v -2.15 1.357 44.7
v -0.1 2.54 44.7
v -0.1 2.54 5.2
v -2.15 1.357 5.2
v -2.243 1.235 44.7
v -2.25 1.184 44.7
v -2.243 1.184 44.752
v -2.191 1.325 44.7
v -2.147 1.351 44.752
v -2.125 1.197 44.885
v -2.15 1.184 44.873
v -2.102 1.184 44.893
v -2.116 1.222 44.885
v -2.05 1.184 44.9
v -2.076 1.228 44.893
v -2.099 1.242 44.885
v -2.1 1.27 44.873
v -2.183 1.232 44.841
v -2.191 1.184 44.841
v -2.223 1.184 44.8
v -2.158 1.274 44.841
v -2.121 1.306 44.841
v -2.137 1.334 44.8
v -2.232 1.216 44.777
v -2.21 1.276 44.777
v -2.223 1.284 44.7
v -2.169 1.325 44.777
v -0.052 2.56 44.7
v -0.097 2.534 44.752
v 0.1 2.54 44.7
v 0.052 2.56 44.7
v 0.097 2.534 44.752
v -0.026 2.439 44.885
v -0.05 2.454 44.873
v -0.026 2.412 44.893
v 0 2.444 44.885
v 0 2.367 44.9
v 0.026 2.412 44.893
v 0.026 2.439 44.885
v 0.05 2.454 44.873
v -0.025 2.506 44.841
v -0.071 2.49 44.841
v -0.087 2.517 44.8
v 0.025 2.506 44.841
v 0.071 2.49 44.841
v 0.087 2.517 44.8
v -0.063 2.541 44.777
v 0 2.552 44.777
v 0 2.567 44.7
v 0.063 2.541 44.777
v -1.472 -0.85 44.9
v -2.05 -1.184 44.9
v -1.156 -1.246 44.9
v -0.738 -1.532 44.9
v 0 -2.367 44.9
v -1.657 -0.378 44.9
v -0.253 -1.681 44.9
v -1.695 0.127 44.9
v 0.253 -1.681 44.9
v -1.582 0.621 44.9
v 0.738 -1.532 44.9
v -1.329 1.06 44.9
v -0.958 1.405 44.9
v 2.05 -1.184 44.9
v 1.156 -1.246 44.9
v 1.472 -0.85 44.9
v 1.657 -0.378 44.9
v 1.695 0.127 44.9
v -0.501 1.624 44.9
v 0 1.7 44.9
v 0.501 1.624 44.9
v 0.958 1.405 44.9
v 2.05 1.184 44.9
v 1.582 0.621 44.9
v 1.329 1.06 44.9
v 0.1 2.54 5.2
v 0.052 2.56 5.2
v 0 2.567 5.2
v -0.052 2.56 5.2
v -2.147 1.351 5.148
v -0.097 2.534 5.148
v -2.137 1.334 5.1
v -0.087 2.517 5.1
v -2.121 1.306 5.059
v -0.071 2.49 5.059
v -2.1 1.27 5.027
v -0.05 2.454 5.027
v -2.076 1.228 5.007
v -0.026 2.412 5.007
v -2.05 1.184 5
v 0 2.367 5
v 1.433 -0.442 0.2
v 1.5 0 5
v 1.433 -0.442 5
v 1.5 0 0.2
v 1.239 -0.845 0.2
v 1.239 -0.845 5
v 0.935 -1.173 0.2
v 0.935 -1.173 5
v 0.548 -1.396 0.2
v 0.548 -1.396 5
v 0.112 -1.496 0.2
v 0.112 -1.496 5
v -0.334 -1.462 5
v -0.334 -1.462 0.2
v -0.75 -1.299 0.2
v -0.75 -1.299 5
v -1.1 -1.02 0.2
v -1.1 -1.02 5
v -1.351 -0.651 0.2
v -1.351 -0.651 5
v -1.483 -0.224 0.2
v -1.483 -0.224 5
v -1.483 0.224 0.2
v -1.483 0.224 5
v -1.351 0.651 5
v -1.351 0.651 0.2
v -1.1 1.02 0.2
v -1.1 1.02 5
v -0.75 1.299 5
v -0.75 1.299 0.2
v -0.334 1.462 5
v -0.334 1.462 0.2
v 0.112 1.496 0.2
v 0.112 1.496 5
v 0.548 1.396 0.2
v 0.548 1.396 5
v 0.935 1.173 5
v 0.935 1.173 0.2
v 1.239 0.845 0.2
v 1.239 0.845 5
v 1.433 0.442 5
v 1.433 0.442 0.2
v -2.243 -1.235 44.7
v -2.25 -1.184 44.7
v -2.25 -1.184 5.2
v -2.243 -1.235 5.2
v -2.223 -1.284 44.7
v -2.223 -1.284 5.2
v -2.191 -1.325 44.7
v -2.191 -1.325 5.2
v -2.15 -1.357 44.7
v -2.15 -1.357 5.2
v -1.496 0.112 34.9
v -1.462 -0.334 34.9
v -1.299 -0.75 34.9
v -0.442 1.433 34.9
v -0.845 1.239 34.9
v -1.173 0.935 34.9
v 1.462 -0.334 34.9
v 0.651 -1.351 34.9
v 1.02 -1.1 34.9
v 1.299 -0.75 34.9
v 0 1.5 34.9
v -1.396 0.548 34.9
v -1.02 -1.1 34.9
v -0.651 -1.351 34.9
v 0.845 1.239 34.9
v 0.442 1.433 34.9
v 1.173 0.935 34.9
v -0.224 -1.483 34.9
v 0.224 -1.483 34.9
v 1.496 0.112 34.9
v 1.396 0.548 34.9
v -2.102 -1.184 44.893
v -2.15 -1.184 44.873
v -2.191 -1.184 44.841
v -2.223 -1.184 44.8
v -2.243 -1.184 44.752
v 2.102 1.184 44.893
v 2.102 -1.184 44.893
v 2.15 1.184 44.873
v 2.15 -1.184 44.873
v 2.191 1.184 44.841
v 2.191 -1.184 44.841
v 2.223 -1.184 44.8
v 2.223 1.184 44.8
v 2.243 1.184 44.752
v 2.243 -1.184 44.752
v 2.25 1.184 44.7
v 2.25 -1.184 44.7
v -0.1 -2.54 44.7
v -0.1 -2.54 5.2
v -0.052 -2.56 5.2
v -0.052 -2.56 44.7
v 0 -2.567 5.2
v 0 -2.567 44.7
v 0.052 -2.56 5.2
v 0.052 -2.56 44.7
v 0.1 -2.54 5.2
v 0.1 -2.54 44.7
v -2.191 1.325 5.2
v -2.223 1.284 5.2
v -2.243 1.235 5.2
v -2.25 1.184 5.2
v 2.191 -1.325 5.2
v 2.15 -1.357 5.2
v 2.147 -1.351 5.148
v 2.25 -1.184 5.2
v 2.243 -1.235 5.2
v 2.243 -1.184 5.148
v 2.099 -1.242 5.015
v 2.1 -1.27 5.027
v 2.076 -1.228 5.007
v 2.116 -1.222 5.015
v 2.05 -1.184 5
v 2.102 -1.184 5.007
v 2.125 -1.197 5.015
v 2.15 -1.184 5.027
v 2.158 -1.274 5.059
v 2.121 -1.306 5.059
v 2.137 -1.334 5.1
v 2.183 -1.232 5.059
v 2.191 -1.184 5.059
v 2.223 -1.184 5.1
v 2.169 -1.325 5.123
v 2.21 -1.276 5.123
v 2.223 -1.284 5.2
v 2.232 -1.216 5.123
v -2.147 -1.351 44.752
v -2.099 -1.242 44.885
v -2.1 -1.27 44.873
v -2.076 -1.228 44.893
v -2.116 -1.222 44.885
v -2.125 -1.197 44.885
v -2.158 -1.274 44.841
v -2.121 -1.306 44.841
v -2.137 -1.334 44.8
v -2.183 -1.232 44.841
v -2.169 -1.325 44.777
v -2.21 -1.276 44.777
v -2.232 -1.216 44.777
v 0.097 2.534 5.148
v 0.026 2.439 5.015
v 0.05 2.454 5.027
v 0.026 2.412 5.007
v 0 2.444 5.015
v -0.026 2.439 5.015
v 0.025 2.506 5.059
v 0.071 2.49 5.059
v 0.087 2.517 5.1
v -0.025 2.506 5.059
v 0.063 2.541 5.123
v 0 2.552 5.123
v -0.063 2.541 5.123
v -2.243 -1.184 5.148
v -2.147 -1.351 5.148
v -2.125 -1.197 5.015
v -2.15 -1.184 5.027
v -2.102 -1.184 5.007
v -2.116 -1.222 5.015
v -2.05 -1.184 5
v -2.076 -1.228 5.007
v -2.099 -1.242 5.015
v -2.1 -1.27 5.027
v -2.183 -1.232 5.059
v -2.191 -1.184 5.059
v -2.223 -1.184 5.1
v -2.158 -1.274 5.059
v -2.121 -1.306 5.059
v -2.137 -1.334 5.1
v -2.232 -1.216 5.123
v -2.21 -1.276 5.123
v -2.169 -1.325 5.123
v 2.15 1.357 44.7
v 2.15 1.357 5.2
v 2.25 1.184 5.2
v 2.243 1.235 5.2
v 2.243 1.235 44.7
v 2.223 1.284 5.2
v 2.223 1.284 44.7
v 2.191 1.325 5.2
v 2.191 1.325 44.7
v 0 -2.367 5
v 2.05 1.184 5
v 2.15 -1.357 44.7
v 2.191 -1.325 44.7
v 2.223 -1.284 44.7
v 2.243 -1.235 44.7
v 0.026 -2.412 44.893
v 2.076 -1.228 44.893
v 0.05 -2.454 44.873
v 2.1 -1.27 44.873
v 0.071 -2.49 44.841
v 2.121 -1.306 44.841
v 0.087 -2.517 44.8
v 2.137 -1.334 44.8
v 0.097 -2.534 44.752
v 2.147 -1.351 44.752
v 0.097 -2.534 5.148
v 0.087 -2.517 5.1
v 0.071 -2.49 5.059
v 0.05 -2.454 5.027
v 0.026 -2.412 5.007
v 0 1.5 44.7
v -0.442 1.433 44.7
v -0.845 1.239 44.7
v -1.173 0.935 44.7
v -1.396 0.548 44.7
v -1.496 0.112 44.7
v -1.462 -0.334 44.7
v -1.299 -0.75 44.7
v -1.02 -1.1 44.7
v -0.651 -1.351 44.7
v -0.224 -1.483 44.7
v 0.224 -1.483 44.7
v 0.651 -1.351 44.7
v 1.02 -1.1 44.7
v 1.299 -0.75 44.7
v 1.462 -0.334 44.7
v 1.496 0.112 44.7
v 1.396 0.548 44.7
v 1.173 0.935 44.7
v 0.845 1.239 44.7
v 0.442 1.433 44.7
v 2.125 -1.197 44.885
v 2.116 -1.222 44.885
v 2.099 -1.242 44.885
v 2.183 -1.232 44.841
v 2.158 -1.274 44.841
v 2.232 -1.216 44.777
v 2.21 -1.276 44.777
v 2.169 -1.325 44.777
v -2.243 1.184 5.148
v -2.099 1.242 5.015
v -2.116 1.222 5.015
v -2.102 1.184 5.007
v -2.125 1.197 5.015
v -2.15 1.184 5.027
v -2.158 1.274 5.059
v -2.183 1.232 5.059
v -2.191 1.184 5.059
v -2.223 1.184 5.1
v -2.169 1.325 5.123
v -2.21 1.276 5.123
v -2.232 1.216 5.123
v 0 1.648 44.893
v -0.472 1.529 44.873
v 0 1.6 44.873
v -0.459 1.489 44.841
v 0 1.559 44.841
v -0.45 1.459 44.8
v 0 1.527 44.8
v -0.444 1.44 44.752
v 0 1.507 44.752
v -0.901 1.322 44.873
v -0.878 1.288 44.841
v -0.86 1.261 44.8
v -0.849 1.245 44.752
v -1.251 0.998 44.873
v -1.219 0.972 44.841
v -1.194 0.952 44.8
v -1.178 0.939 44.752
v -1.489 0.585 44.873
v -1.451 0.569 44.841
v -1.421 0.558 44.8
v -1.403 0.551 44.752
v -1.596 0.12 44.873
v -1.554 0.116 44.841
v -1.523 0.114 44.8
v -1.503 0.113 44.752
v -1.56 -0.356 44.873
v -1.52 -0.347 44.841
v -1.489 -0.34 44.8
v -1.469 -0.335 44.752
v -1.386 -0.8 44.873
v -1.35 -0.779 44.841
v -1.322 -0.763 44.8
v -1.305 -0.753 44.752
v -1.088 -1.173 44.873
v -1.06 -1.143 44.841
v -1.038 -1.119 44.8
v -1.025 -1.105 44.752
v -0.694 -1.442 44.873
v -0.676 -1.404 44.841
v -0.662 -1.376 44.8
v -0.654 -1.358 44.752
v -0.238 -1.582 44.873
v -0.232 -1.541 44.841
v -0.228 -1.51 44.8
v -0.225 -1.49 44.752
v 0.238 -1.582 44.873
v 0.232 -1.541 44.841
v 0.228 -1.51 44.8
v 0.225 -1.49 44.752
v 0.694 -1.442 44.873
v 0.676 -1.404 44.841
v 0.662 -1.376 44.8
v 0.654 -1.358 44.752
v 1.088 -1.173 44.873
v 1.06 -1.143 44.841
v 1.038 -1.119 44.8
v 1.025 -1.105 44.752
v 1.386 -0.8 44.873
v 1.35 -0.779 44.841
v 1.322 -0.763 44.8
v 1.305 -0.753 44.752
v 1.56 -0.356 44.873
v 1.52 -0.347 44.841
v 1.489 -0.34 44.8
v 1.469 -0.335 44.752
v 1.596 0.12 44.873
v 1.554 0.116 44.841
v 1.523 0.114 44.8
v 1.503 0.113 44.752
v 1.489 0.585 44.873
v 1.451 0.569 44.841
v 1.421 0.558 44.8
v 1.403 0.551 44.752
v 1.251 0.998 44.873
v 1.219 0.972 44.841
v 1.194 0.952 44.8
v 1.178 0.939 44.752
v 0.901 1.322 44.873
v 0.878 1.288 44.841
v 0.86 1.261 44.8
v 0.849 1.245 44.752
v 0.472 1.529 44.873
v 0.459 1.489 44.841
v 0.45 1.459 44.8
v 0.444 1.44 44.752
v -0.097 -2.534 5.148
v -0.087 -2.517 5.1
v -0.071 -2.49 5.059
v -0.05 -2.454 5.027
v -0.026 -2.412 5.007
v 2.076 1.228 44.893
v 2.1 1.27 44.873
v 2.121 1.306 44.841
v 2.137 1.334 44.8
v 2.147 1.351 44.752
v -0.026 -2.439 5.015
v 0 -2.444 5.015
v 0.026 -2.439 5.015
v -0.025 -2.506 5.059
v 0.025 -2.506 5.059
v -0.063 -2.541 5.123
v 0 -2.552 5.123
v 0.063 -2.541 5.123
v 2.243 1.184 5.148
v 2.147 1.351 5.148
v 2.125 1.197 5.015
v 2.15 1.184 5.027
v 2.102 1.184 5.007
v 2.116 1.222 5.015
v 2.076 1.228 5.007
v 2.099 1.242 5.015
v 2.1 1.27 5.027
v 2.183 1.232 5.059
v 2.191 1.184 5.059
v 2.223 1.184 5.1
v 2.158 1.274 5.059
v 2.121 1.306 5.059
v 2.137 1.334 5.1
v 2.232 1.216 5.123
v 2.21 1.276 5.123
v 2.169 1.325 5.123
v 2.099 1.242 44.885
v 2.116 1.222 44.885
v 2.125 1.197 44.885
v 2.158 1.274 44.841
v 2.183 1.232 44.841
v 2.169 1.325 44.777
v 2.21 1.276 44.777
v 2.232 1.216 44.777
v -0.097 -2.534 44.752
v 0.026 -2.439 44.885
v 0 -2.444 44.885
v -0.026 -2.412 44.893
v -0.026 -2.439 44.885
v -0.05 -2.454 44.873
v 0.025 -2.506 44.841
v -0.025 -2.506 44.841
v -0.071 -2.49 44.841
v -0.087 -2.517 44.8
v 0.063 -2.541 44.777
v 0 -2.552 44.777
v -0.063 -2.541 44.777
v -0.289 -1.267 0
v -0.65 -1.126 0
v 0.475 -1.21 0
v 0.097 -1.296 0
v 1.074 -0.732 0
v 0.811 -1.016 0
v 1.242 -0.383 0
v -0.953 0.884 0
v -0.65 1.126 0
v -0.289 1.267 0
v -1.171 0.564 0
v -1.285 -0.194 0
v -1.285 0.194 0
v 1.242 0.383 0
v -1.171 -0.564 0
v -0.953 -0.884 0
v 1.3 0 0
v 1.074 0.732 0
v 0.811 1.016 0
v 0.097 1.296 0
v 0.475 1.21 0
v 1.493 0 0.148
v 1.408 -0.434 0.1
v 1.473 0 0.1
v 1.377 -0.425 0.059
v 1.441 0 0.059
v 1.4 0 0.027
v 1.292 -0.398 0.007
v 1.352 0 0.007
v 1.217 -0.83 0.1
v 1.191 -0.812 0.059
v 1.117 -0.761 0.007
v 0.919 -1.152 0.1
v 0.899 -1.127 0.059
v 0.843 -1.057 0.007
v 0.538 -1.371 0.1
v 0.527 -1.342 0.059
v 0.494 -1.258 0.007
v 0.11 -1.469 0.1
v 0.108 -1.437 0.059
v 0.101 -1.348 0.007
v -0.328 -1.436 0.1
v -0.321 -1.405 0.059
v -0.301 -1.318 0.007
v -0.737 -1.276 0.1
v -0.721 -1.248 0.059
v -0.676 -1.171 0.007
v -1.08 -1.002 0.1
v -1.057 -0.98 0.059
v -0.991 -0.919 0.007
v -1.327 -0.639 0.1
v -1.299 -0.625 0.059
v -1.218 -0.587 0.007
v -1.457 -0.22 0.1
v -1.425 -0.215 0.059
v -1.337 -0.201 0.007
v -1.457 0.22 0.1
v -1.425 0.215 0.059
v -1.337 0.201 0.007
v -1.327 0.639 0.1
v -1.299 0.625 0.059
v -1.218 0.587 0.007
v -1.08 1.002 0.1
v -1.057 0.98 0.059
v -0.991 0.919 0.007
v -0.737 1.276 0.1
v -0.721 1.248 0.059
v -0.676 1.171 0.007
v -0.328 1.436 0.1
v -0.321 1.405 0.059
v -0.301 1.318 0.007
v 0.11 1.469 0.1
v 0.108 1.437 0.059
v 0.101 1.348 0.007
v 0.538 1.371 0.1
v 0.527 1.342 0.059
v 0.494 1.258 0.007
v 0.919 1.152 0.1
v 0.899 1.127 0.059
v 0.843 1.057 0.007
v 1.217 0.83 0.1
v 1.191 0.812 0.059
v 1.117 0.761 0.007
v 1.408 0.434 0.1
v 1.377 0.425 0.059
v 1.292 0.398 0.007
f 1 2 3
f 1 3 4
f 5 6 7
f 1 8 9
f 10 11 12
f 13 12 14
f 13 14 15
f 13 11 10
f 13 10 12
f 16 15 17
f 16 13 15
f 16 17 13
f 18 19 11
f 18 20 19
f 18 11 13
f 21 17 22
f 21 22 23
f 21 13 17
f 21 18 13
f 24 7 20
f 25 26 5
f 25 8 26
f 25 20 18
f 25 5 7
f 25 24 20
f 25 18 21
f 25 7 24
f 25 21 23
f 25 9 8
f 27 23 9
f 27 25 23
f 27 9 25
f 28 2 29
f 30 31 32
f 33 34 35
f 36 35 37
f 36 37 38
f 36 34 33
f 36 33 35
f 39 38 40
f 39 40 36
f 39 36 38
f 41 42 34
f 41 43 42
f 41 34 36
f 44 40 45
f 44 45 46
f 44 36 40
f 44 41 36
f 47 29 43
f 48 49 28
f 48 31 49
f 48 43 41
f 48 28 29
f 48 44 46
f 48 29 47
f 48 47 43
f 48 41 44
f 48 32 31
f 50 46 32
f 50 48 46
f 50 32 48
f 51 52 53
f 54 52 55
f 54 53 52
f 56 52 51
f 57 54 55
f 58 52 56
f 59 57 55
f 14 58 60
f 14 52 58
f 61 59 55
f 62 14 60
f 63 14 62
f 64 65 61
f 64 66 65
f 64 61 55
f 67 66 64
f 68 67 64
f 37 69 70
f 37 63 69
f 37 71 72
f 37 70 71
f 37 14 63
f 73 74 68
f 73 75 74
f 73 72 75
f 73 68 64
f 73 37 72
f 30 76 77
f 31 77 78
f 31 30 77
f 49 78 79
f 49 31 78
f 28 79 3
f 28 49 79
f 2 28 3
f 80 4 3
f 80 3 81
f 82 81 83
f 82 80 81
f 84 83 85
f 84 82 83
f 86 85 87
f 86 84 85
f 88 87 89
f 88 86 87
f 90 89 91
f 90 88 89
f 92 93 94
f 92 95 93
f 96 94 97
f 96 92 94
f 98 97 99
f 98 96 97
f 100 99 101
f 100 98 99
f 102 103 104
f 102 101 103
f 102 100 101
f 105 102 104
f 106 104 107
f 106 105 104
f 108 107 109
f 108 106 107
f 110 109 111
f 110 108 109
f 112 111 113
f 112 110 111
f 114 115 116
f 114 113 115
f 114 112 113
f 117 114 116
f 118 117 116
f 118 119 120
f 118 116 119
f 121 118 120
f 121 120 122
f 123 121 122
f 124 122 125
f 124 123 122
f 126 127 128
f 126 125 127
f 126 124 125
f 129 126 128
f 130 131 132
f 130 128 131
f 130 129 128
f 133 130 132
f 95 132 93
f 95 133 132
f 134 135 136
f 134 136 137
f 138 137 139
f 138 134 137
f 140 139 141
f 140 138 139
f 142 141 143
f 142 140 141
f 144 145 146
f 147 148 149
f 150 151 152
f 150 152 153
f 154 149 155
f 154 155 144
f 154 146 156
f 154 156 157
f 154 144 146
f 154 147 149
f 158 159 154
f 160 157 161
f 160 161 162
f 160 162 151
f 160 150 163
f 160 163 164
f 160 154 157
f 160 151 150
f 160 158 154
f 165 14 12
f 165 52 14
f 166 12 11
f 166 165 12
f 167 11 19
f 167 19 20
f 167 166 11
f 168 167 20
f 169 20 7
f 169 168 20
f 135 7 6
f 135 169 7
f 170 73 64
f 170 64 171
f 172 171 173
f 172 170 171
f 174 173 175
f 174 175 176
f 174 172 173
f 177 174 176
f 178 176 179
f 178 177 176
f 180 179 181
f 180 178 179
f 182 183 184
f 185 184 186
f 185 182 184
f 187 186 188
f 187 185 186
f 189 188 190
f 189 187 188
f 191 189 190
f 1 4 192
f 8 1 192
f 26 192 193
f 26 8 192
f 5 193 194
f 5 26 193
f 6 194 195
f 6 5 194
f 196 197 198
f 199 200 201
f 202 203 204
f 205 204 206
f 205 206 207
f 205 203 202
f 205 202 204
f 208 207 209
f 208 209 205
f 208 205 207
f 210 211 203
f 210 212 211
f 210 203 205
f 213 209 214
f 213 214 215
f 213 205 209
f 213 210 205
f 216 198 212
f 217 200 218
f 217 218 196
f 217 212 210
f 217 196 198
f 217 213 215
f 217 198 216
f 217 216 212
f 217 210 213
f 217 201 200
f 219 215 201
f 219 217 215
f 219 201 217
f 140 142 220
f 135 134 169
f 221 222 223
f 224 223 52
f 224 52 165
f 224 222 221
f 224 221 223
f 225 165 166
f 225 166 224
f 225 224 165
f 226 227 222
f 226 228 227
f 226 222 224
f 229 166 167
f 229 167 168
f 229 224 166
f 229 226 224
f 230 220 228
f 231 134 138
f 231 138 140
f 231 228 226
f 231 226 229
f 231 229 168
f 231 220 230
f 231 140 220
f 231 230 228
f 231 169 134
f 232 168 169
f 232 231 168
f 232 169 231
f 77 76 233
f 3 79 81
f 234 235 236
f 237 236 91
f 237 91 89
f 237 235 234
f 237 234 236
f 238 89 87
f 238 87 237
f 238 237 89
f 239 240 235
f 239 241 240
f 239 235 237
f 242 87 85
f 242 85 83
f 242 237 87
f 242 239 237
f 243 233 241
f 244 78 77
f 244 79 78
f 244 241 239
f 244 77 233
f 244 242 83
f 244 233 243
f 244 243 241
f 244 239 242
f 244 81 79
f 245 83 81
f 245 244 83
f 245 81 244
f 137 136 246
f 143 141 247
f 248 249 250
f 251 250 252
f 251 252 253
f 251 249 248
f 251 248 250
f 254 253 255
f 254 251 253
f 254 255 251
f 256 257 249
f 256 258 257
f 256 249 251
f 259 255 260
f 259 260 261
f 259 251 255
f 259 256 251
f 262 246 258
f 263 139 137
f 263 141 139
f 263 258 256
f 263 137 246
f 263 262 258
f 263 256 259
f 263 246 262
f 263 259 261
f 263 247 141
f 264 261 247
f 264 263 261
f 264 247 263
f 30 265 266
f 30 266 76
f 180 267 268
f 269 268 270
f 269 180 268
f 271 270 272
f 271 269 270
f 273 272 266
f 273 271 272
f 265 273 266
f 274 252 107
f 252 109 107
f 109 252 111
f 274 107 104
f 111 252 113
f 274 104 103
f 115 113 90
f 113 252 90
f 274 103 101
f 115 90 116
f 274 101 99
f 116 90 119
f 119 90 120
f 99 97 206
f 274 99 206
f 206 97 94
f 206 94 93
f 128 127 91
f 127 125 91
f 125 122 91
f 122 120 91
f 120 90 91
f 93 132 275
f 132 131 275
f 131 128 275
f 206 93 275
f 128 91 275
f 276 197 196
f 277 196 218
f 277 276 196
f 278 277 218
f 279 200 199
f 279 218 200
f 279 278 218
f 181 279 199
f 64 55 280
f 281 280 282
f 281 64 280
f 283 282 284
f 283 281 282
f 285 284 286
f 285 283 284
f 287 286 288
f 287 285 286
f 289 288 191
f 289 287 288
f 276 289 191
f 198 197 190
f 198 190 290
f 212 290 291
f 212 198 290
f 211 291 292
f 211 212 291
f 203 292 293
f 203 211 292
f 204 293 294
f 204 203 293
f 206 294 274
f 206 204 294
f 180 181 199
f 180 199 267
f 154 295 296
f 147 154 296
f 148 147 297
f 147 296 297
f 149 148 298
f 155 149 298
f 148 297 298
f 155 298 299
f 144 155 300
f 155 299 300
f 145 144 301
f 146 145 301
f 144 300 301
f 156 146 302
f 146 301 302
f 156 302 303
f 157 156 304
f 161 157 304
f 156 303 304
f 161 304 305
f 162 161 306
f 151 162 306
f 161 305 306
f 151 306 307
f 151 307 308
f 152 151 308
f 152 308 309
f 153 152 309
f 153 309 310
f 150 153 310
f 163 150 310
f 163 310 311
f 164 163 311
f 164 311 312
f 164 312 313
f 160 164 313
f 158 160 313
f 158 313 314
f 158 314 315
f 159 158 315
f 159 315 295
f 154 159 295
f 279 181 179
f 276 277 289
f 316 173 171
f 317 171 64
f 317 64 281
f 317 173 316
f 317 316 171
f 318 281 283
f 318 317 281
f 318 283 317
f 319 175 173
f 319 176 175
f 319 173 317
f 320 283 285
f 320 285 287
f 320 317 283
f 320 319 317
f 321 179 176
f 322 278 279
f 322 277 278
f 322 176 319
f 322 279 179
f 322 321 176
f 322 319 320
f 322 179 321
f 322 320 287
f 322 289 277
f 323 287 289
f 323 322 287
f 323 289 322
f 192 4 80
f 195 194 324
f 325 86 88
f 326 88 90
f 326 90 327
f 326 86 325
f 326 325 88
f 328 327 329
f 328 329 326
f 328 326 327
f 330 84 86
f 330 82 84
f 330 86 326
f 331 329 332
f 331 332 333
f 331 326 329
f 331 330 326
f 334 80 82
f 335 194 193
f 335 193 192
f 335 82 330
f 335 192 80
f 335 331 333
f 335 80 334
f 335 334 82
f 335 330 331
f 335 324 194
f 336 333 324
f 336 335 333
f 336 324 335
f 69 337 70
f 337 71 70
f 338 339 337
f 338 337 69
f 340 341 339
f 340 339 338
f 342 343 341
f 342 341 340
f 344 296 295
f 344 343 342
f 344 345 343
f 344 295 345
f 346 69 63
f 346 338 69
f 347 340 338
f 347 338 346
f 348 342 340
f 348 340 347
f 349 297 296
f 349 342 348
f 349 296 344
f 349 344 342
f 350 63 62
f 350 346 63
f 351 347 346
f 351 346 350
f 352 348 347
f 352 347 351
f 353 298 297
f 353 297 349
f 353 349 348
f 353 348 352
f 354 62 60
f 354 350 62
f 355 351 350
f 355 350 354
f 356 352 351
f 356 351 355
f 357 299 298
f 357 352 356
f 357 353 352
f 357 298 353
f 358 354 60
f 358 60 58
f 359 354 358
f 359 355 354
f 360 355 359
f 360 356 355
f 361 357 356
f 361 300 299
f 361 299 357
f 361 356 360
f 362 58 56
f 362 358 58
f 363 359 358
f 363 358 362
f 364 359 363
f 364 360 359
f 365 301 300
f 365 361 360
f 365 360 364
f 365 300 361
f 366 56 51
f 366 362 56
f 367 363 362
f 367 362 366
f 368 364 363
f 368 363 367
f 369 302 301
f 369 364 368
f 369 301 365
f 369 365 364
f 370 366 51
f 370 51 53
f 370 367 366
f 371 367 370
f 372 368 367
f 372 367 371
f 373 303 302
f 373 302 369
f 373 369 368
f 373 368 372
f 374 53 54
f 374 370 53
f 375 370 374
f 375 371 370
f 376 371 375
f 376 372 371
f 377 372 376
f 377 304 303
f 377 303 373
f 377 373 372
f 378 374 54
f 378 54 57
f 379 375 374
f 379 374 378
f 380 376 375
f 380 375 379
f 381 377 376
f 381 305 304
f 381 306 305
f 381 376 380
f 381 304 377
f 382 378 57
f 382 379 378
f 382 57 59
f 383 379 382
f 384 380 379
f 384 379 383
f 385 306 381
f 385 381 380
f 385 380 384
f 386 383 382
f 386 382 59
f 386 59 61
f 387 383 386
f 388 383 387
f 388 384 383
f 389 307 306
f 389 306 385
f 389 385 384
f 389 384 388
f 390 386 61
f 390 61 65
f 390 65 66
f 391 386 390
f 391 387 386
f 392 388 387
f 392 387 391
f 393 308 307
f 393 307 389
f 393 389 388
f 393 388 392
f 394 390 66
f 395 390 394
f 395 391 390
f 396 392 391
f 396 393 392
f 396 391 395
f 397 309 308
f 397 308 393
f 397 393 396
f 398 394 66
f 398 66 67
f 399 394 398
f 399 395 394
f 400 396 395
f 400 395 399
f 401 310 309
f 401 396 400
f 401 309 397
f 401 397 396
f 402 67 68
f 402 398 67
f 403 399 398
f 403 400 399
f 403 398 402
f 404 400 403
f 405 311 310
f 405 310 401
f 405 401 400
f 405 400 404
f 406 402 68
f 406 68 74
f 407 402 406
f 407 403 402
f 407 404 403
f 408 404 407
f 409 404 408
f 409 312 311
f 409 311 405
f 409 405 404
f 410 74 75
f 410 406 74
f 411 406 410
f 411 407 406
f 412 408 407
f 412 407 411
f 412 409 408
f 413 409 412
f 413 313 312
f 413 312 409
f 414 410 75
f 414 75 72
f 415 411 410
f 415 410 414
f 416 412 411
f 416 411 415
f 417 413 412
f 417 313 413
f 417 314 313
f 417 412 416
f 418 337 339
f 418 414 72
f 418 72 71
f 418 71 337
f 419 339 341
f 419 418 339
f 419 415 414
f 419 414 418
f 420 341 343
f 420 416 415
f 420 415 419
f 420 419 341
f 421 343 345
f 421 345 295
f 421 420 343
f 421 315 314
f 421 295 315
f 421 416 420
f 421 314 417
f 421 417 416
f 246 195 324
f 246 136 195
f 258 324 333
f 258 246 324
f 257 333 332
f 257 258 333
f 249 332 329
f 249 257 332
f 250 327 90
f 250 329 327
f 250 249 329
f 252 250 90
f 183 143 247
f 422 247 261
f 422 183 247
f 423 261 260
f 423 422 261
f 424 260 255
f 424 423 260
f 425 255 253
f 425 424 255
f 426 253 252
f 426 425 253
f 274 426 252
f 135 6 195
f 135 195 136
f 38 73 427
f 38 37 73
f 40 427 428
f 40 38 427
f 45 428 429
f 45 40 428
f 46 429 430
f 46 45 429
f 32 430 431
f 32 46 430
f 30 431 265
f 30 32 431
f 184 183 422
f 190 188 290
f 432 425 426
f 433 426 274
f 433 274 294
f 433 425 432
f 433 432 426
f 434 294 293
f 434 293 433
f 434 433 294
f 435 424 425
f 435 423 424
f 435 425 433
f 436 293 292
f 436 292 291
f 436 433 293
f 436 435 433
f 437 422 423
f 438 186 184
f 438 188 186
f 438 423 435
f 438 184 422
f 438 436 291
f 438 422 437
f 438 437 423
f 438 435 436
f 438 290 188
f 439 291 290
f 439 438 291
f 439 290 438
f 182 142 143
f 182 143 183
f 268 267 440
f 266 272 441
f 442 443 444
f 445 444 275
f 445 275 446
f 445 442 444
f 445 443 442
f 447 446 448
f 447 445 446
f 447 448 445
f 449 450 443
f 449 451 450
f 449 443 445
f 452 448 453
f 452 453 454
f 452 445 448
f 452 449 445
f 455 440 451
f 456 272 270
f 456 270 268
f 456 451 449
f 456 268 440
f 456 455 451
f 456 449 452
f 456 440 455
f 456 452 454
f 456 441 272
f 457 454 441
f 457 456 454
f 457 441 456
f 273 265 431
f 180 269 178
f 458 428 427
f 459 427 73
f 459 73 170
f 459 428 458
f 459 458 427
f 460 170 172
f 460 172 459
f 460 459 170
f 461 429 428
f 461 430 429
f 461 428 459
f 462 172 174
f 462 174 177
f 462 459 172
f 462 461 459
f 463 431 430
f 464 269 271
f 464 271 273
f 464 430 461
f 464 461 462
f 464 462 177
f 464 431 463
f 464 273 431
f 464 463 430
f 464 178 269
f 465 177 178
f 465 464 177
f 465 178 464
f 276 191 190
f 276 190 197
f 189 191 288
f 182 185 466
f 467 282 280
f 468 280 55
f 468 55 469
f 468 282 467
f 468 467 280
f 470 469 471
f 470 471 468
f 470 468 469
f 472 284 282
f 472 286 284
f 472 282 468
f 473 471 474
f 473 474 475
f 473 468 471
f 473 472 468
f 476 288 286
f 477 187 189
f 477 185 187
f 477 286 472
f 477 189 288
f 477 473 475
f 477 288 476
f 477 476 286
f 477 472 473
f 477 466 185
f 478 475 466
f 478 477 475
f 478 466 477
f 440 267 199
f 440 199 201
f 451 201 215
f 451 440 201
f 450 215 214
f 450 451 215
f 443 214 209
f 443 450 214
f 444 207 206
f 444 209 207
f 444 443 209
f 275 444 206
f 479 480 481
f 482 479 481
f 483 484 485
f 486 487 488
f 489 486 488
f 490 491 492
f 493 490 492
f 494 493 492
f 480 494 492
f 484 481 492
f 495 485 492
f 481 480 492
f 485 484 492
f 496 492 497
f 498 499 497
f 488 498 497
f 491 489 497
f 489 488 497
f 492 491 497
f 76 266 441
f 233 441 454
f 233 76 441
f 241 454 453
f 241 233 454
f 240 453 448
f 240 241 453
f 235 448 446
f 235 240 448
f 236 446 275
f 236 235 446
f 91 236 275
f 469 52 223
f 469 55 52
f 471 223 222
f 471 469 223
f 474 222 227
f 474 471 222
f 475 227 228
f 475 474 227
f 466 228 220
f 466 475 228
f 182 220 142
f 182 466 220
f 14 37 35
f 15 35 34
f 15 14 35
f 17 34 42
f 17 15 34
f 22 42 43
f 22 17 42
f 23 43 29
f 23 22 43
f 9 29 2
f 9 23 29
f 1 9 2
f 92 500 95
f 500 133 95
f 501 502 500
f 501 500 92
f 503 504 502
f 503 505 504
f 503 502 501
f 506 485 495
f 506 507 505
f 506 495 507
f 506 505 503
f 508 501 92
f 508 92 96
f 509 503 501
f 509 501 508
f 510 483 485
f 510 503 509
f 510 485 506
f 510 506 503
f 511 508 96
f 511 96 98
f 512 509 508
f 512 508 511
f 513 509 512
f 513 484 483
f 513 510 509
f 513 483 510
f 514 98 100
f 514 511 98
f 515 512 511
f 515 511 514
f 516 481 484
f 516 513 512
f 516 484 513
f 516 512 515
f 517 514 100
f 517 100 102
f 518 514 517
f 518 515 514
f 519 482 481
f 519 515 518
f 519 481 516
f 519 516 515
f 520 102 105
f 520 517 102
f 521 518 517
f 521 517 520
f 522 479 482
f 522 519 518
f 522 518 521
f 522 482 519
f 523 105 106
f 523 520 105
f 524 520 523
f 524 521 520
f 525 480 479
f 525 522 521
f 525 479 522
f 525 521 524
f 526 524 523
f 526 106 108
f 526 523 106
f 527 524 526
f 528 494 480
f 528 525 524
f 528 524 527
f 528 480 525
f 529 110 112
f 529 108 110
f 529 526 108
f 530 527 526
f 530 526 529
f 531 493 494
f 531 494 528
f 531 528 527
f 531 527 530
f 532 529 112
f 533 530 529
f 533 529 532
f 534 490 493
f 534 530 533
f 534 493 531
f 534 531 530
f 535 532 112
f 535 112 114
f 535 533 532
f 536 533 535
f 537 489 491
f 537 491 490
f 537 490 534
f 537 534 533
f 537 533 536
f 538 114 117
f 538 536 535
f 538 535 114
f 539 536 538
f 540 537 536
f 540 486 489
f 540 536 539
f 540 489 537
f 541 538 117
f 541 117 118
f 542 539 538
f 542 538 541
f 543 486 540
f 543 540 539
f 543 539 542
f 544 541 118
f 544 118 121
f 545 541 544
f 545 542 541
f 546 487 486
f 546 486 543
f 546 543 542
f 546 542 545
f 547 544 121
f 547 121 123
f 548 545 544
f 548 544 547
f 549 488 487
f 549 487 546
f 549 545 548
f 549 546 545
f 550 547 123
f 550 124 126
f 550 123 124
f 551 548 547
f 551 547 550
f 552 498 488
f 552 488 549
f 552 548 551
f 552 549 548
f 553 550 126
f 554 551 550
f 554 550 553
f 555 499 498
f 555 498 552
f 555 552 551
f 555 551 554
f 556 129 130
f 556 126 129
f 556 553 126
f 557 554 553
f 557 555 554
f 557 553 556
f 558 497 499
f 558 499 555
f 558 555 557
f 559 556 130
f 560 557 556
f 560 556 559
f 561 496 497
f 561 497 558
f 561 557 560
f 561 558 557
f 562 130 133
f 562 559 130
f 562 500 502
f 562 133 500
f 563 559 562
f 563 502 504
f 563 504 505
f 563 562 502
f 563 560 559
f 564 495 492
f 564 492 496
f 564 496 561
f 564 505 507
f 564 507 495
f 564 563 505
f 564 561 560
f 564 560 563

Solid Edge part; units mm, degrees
sketch "Sketch1" plane through (0, 0, 0) normal (0, 0, 1) x (1, 0, 0)
  circle A0 centre (0, 0) radius 1.5
extrude "Protrusion1" add sketch "Sketch1" along normal blind 5
sketch "Sketch2" plane through (0, 0, 5) normal (0, 0, 1) x (1, 0, 0)
  line L0 (2.25, 1.299) -> (0, 2.5981)
  line L1 (0, 2.5981) -> (-2.25, 1.299)
  line L2 (-2.25, 1.299) -> (-2.25, -1.299)
  line L3 (-2.25, -1.299) -> (0, -2.5981)
  line L4 (0, -2.5981) -> (2.25, -1.299)
  line L5 (2.25, -1.299) -> (2.25, 1.299)
extrude "ExtrudedProtrusion_2" add sketch "Sketch2" along normal blind 39.9
sketch "Sketch3" plane through (0, 0, 44.9) normal (0, 0, 1) x (0, 1, 0)
  circle A0 centre (0, 0) radius 1.5
extrude "ExtrudedCutout_1" cut sketch "Sketch3" against normal blind 10
fillet "Round_1" radius 0.2 20 edges at (2.25, -1.299, 24.95) (2.25, 1.299, 24.95) (2.25, 0, 44.9) (1.125, 1.9486, 44.9) (0, -1.5, 44.9) (0, 2.5981, 24.95) (1.125, 1.9486, 5) (2.25, 0, 5) (1.125, -1.9486, 5) (0, -2.5981, 24.95) (1.125, -1.9486, 44.9) (-1.125, -1.9486, 44.9) (-1.125, -1.9486, 5) (-2.25, -1.299, 24.95) (-2.25, 0, 44.9) (-1.125, 1.9486, 44.9) (-2.25, 1.299, 24.95) (-2.25, 0, 5) (-1.125, 1.9486, 5) (-1.5, 0, 0)
properties material "Brass, yellow brass"
